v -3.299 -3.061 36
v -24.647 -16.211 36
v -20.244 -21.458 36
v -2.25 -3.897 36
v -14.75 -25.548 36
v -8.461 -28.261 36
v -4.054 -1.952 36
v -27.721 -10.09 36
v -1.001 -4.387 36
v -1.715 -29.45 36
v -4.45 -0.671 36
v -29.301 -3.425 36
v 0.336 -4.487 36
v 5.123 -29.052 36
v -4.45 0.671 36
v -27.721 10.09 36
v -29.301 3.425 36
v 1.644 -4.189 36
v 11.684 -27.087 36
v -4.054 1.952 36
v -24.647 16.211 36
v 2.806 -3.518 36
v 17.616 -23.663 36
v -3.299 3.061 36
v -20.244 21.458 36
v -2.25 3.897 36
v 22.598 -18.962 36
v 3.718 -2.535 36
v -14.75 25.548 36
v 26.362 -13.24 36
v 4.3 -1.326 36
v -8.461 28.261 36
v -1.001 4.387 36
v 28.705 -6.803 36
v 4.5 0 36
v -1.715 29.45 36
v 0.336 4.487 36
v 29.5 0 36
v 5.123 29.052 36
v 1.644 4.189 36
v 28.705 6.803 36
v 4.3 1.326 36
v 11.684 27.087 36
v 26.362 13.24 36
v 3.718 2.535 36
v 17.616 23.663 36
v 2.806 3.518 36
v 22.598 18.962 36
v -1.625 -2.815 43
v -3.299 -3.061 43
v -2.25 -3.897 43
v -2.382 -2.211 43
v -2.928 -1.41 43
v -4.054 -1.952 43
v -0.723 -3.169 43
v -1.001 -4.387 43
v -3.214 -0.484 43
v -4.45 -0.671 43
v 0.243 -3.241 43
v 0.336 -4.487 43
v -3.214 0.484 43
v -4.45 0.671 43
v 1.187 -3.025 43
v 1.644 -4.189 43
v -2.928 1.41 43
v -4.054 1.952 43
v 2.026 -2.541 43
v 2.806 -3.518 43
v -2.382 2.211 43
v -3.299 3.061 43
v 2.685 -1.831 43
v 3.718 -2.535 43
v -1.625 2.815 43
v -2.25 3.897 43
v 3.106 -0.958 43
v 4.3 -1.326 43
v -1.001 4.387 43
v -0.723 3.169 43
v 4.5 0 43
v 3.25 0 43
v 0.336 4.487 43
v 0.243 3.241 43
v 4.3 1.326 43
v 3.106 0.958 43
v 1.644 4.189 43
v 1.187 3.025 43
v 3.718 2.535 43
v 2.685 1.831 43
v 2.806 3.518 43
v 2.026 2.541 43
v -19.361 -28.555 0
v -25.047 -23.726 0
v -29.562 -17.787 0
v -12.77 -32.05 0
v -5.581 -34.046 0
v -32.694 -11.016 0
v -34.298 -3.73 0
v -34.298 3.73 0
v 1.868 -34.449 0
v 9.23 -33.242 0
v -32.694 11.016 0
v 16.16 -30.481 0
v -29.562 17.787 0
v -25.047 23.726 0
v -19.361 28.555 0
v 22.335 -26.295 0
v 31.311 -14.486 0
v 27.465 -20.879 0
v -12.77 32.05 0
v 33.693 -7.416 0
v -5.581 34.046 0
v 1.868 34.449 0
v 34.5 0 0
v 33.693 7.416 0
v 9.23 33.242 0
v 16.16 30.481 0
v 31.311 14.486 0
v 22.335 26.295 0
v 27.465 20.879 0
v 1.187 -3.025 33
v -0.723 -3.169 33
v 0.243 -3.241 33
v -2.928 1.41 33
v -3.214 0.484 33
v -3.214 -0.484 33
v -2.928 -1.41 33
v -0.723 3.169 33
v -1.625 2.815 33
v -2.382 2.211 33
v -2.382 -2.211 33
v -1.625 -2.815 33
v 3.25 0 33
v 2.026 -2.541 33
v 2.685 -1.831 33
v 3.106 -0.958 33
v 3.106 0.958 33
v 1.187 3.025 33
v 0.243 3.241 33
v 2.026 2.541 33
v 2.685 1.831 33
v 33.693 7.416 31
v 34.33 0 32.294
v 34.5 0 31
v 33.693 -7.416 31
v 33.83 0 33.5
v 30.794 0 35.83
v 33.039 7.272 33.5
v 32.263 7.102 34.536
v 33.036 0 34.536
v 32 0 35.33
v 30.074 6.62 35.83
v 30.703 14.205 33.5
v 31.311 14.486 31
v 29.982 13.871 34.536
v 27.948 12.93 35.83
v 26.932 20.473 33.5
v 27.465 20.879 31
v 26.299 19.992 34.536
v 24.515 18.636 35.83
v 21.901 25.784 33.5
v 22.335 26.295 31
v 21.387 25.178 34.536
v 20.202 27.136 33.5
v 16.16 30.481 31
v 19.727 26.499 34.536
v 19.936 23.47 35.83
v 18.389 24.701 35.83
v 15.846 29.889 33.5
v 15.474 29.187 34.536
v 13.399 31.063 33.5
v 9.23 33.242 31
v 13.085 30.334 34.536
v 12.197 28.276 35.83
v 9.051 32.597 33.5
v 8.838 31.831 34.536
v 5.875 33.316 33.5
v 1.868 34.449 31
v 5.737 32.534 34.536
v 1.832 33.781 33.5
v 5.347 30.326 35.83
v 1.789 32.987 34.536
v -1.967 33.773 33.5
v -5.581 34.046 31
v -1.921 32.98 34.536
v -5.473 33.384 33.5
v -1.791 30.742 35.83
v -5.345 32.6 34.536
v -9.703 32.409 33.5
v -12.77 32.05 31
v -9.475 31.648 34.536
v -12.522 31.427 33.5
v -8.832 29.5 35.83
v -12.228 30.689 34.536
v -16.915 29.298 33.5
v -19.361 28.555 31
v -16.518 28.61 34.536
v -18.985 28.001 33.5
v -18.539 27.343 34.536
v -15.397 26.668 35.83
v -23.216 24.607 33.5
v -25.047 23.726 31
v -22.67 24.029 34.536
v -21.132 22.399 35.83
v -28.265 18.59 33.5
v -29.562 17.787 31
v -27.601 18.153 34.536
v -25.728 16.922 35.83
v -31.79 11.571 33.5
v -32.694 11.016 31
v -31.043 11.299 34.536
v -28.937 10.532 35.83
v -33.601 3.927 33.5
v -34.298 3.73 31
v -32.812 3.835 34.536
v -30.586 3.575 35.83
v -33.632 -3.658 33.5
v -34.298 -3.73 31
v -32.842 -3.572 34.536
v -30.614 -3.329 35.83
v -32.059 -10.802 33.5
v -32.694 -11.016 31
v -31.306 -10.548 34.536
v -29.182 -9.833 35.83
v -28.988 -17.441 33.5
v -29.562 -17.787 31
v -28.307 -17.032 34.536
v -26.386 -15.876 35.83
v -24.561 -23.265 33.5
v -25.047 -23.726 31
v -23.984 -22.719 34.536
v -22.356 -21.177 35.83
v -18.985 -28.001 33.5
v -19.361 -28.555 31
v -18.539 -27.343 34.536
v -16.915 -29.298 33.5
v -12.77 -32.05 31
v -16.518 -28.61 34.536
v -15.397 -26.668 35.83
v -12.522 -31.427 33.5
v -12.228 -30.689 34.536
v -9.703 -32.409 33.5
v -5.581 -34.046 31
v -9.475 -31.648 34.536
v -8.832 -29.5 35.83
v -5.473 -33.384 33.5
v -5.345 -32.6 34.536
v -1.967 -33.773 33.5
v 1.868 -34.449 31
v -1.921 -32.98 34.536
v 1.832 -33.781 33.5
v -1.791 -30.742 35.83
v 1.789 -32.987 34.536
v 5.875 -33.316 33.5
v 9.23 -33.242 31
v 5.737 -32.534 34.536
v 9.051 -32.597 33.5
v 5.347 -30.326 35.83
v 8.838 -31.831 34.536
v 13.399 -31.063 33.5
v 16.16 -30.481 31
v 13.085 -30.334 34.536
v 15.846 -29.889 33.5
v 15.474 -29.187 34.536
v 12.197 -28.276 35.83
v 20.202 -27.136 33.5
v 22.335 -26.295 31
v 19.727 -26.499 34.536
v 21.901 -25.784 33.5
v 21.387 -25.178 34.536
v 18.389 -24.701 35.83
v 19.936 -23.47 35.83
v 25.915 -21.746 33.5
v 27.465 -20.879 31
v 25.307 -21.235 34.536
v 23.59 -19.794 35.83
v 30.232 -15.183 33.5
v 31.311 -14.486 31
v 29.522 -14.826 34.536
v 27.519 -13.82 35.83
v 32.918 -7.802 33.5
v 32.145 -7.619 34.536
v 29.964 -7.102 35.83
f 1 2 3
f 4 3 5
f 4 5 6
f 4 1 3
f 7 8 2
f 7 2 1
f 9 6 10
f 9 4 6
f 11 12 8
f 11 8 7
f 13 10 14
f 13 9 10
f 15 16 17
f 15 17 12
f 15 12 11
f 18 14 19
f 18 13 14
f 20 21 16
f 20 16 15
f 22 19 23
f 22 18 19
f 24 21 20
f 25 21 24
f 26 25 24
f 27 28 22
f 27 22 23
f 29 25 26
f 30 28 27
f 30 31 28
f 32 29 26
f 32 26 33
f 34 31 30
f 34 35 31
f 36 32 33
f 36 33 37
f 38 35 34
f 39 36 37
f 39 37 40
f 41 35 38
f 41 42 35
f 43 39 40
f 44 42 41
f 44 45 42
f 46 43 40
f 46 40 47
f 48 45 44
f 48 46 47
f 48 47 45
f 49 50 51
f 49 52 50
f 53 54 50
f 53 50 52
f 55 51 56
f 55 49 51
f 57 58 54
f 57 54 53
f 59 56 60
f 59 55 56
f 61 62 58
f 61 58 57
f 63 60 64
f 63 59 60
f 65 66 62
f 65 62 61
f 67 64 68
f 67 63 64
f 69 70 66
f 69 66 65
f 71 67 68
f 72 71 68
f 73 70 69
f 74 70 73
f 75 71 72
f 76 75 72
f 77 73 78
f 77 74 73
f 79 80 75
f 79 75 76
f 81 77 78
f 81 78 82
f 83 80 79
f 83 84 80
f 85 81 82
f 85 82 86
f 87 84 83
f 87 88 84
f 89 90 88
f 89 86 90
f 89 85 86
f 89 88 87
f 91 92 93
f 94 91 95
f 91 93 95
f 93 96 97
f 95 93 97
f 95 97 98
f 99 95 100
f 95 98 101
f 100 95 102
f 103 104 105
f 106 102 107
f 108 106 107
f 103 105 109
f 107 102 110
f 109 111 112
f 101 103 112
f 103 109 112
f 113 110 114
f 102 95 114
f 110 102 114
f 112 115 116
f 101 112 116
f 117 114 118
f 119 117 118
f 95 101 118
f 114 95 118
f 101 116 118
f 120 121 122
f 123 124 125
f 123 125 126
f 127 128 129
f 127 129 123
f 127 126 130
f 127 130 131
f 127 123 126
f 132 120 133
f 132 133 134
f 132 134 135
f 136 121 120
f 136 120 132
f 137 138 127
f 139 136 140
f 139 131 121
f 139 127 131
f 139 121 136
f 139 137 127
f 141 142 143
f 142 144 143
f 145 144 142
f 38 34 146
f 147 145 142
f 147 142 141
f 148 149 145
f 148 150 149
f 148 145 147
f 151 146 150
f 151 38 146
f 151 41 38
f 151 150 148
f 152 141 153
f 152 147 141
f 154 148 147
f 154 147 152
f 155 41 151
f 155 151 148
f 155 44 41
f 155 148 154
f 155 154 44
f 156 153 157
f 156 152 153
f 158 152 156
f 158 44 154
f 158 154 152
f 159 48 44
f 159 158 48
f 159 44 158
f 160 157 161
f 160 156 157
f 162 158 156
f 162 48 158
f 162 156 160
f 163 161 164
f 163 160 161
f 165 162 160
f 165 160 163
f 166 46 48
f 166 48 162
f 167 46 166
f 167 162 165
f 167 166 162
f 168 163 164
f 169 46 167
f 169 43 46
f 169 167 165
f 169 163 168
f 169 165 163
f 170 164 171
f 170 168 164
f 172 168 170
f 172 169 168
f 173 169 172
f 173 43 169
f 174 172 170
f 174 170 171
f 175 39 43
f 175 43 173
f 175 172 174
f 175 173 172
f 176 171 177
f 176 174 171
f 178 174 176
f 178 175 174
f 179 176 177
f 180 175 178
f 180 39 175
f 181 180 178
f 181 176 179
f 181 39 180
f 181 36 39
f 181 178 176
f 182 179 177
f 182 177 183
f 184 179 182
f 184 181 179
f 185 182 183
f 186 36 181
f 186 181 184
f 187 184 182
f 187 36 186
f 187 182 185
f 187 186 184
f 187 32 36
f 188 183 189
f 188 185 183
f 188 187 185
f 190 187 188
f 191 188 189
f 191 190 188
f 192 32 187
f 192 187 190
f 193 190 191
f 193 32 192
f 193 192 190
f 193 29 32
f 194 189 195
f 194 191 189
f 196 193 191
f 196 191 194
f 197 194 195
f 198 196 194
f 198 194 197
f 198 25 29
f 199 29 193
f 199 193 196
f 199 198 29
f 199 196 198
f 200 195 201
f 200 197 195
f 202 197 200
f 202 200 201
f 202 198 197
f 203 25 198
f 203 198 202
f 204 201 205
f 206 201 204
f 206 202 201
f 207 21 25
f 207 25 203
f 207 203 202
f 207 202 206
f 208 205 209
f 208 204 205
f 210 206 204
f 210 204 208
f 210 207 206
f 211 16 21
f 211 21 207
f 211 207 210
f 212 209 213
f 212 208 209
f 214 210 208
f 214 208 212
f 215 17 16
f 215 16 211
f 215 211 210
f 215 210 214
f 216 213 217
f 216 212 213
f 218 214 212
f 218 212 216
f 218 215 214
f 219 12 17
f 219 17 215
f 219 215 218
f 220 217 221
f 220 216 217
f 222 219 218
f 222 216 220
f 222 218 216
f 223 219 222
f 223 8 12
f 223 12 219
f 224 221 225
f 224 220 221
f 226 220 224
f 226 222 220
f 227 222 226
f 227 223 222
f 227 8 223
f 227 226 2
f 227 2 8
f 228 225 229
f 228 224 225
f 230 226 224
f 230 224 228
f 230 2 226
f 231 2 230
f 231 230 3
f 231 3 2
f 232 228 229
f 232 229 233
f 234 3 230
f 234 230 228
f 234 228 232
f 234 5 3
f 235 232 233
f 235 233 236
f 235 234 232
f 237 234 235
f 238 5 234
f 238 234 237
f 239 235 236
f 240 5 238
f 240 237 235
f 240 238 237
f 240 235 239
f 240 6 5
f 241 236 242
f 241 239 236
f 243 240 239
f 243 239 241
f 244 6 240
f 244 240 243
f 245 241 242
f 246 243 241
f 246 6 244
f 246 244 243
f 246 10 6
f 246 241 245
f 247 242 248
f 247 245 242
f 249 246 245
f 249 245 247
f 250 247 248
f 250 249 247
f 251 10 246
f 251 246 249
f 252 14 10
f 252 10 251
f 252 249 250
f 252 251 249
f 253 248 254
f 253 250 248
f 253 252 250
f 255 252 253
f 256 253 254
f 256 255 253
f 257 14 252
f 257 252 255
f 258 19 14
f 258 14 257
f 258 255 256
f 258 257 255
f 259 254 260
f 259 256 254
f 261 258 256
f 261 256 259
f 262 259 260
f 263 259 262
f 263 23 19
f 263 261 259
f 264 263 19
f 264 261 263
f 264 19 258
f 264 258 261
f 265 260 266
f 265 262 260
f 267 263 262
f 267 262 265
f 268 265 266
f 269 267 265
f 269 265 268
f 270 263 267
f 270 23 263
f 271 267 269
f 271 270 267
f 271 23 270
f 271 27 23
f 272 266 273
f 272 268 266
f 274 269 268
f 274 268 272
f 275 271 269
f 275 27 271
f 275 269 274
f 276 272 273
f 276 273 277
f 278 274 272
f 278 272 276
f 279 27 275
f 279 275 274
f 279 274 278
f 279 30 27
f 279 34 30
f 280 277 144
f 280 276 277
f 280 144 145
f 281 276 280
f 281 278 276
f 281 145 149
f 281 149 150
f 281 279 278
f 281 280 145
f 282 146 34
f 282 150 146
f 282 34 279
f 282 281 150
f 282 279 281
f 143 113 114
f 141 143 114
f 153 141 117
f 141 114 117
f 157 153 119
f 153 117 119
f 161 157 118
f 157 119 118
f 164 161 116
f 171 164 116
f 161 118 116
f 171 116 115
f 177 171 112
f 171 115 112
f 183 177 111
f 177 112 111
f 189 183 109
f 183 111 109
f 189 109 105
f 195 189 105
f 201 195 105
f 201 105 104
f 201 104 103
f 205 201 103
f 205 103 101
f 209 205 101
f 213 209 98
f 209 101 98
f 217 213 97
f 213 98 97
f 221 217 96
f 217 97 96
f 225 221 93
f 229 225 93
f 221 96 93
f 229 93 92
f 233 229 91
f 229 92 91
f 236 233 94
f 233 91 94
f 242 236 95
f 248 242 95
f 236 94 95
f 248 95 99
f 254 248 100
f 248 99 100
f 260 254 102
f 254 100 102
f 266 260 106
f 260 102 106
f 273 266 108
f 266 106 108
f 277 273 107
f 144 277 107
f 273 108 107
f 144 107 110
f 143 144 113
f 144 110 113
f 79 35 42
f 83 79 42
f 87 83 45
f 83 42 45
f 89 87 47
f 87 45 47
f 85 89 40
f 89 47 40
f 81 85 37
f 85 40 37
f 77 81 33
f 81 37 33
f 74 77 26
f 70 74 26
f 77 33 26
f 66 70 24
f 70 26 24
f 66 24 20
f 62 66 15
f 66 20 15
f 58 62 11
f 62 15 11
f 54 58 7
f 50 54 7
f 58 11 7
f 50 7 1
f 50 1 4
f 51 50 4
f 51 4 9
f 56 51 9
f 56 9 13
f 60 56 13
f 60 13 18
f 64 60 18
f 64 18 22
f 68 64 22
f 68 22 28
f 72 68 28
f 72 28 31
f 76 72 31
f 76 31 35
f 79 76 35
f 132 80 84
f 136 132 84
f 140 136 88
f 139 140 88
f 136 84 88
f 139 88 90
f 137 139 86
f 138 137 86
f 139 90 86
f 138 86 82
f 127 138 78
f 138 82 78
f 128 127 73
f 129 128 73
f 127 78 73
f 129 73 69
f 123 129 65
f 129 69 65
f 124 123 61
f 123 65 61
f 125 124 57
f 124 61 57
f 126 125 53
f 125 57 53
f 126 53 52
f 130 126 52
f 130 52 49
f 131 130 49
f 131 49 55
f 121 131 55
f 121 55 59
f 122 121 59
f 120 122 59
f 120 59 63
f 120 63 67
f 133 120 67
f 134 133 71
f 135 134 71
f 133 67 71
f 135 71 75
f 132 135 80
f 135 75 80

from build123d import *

# Parameters (mm, degrees)
F1_R     = 3.25
F3_DEPTH = 10
F0_R     = 34.5
F4_DEPTH = 36
F2_R     = 4.5
F5_DEPTH = 43
F6_R     = 5
F7_R     = 3.25
F8_DEPTH = 10


with BuildPart() as f3:
    # F1 (on Top) → F3 (new body)
    with BuildSketch(Plane.XY):
        Circle(F1_R)
    extrude(amount=F3_DEPTH)

    # F0 (on Top) → F4 (join)
    with BuildSketch(Plane.XY):
        Circle(F0_R)
    extrude(amount=F4_DEPTH)

    # F2 (on Top) → F5 (join)
    with BuildSketch(Plane.XY):
        Circle(F2_R)
    extrude(amount=F5_DEPTH)

    # F6
    f6_edges = [f3.edges().sort_by_distance(p)[0] for p in [
        (-34.5, 0, 36),
    ]]
    fillet(f6_edges, radius=F6_R)

    # F7 (on face) → F8 (cut)
    with BuildSketch(Plane.XY.offset(43)):
        Circle(F7_R)
    extrude(amount=-F8_DEPTH, mode=Mode.SUBTRACT)


solid = f3.part
